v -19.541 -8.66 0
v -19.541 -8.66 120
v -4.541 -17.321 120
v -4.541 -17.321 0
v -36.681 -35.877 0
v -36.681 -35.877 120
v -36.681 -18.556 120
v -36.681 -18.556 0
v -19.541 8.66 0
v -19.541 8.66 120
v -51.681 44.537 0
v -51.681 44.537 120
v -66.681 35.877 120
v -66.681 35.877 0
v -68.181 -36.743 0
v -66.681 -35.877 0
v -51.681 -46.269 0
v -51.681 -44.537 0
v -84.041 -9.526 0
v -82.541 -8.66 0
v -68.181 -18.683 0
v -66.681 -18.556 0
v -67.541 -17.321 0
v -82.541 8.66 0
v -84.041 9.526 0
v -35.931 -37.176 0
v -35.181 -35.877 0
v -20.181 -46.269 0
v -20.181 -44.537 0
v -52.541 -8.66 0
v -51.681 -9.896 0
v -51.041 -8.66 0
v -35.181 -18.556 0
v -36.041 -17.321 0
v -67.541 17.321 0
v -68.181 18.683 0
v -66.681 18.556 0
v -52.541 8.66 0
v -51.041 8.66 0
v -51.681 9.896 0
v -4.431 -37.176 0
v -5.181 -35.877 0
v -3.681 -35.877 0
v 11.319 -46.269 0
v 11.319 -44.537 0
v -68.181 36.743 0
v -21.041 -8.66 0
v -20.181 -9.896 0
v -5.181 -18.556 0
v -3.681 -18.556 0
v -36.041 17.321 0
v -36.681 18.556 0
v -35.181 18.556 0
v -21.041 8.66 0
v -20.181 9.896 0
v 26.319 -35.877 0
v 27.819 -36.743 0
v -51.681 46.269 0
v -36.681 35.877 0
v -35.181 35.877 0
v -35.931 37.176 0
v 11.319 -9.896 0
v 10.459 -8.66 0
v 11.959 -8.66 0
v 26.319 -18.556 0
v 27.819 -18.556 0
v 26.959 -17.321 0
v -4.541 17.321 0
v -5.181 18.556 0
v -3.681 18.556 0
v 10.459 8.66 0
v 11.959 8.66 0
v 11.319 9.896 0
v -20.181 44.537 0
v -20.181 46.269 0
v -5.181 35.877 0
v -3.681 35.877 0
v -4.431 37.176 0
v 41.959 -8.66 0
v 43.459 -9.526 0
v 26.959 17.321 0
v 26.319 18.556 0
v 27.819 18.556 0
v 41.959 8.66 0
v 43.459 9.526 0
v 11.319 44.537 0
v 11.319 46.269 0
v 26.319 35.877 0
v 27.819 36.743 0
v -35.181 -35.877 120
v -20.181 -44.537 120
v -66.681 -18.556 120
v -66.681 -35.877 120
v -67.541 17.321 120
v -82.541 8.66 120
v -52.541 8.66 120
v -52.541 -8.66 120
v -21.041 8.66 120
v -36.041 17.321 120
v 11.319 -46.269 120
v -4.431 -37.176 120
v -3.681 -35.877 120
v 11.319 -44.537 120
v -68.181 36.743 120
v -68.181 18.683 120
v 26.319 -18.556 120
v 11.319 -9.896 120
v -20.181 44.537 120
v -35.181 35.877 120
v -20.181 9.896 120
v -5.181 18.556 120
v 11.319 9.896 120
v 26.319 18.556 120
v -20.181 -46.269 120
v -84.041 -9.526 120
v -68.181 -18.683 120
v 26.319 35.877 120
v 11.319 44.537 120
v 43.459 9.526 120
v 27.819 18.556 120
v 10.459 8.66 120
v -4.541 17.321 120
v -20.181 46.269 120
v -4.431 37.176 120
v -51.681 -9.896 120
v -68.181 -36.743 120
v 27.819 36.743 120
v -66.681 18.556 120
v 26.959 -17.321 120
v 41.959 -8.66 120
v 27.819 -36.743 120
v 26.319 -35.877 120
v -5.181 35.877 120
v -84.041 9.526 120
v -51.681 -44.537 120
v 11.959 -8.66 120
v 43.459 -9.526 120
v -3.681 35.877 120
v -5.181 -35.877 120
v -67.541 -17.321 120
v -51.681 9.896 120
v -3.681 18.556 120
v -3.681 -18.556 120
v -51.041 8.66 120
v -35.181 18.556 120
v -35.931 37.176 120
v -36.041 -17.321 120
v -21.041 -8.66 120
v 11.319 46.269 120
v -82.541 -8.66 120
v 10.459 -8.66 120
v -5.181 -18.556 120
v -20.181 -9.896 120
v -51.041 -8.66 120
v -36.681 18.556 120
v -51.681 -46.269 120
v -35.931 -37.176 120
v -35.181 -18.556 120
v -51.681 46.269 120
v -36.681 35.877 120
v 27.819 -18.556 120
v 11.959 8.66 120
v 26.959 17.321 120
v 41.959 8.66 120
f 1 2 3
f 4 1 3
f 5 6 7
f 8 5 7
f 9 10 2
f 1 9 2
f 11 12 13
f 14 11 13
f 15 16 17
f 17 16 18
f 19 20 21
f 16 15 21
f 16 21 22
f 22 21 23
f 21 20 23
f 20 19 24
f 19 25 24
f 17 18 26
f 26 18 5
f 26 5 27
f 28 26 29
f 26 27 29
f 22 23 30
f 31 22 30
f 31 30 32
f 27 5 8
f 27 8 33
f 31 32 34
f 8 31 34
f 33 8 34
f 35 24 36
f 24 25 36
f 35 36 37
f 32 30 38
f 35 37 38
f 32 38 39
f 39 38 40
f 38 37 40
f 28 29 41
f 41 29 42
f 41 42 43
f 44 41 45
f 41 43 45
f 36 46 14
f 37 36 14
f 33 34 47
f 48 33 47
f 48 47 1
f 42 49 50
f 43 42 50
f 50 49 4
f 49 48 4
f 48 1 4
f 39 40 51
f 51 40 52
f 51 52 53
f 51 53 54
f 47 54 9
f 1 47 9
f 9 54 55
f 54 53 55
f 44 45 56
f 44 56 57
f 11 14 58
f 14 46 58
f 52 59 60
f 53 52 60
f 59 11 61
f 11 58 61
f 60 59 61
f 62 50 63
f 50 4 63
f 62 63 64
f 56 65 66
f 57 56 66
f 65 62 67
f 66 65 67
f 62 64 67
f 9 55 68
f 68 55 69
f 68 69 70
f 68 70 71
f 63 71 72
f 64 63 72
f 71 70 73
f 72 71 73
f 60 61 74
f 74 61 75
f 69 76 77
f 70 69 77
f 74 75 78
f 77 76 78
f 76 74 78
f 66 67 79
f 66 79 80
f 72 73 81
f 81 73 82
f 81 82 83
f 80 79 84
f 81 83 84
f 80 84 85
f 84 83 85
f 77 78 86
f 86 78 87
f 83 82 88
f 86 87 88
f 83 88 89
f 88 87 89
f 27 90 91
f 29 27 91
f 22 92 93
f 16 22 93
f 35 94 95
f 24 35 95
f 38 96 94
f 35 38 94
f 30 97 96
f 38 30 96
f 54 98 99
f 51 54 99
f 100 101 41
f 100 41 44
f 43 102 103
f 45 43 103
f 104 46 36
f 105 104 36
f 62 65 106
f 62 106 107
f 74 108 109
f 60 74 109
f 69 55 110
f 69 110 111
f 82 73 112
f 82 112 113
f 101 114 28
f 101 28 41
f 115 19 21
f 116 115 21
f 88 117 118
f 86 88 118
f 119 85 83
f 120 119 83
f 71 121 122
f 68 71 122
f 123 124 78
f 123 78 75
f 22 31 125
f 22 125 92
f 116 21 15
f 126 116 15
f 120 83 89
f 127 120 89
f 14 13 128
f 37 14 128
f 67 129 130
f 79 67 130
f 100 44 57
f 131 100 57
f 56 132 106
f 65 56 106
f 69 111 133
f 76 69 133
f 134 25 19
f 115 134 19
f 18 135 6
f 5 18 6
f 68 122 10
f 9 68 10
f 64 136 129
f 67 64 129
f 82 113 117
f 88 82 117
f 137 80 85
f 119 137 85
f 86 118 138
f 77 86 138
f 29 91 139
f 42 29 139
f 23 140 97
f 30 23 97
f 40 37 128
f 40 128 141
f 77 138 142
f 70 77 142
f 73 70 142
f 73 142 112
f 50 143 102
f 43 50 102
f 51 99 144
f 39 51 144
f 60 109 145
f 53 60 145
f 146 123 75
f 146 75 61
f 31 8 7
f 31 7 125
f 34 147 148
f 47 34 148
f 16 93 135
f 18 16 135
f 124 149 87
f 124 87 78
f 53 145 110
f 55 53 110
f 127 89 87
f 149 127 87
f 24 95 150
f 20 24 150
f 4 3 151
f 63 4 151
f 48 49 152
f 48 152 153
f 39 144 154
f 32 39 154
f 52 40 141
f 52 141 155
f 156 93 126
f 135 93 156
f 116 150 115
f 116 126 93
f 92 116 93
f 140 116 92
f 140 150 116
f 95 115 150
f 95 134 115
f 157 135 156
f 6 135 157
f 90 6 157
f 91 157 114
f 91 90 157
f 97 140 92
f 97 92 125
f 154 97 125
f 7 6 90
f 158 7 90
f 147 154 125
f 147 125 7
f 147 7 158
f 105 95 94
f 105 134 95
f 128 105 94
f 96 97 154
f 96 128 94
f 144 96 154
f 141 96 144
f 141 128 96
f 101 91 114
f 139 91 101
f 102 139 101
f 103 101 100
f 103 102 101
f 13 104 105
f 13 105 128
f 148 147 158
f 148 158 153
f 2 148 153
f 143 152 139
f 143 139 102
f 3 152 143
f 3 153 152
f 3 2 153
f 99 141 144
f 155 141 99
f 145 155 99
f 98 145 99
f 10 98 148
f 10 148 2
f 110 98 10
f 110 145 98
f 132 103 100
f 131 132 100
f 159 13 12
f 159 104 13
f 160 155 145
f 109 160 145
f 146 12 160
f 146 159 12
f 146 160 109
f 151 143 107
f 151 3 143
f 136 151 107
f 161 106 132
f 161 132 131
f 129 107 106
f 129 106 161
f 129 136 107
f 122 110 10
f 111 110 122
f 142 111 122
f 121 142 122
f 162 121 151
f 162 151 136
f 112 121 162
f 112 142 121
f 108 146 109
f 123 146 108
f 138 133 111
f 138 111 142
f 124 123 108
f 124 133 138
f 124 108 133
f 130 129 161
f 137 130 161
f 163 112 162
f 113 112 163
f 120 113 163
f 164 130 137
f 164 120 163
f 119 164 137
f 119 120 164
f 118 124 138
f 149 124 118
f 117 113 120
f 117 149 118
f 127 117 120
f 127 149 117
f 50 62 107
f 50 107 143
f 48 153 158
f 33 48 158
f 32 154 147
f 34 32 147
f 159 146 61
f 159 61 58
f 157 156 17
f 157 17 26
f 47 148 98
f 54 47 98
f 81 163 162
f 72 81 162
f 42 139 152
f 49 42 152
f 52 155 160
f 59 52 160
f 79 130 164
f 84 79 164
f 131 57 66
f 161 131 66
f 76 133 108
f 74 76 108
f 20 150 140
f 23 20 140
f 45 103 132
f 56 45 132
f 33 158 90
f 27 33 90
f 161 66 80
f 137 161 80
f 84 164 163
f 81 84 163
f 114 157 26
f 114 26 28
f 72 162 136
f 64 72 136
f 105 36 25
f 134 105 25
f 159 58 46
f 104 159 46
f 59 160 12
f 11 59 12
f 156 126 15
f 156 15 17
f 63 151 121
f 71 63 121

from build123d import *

# Parameters (mm, degrees)
F1_DEPTH = 120
F3_DEPTH = 120.001


with BuildPart() as f1:
    # F0 (on Top) → F1 (new body)
    with BuildSketch(Plane.XY):
        Polygon((-35.93138, 37.175638), (-51.68138, 46.268904), (-68.18138, 36.742625), (-68.18138, 18.683001), (-84.041286, 9.526279), (-84.041286, -9.526279), (-68.18138, -18.683001), (-68.18138, -36.742625), (-51.68138, -46.268904), (-35.93138, -37.175638), (-20.18138, -46.268904), (-4.43138, -37.175638), (11.31862, -46.268904), (27.81862, -36.742625), (27.81862, -18.556092), (43.458714, -9.526279), (43.458714, 9.526279), (27.81862, 18.556092), (27.81862, 36.742625), (11.31862, 46.268904), (-4.43138, 37.175638), (-20.18138, 46.268904), align=None)
    extrude(amount=F1_DEPTH)

    # F2 (on face) → F3 (cut, through all)
    with BuildSketch(Plane.XY.offset(120)):
        Polygon((-51.68138, 44.536854), (-66.68138, 35.8766), (-66.68138, 18.556092), (-51.68138, 9.895837), (-36.68138, 18.556092), (-36.68138, 35.8766), align=None)
        Polygon((-67.541286, -17.320508), (-52.541286, -8.660254), (-52.541286, 8.660254), (-67.541286, 17.320508), (-82.541286, 8.660254), (-82.541286, -8.660254), align=None)
        Polygon((-51.68138, -44.536854), (-36.68138, -35.8766), (-36.68138, -18.556092), (-51.68138, -9.895837), (-66.68138, -18.556092), (-66.68138, -35.8766), align=None)
        Polygon((-20.18138, 9.895837), (-5.18138, 18.556092), (-5.18138, 35.8766), (-20.18138, 44.536854), (-35.18138, 35.8766), (-35.18138, 18.556092), align=None)
        Polygon((-5.18138, -18.556092), (-20.18138, -9.895837), (-35.18138, -18.556092), (-35.18138, -35.8766), (-20.18138, -44.536854), (-5.18138, -35.8766), align=None)
        Polygon((11.31862, 9.895837), (26.31862, 18.556092), (26.31862, 35.8766), (11.31862, 44.536854), (-3.68138, 35.8766), (-3.68138, 18.556092), align=None)
        Polygon((26.31862, -18.556092), (11.31862, -9.895837), (-3.68138, -18.556092), (-3.68138, -35.8766), (11.31862, -44.536854), (26.31862, -35.8766), align=None)
        Polygon((-21.041286, -8.660254), (-21.041286, 8.660254), (-36.041286, 17.320508), (-51.041286, 8.660254), (-51.041286, -8.660254), (-36.041286, -17.320508), align=None)
        Polygon((10.458714, -8.660254), (10.458714, 8.660254), (-4.541286, 17.320508), (-19.541286, 8.660254), (-19.541286, -8.660254), (-4.541286, -17.320508), align=None)
        Polygon((41.958714, -8.660254), (41.958714, 8.660254), (26.958714, 17.320508), (11.958714, 8.660254), (11.958714, -8.660254), (26.958714, -17.320508), align=None)
    extrude(amount=-F3_DEPTH, mode=Mode.SUBTRACT)


solid = f1.part
